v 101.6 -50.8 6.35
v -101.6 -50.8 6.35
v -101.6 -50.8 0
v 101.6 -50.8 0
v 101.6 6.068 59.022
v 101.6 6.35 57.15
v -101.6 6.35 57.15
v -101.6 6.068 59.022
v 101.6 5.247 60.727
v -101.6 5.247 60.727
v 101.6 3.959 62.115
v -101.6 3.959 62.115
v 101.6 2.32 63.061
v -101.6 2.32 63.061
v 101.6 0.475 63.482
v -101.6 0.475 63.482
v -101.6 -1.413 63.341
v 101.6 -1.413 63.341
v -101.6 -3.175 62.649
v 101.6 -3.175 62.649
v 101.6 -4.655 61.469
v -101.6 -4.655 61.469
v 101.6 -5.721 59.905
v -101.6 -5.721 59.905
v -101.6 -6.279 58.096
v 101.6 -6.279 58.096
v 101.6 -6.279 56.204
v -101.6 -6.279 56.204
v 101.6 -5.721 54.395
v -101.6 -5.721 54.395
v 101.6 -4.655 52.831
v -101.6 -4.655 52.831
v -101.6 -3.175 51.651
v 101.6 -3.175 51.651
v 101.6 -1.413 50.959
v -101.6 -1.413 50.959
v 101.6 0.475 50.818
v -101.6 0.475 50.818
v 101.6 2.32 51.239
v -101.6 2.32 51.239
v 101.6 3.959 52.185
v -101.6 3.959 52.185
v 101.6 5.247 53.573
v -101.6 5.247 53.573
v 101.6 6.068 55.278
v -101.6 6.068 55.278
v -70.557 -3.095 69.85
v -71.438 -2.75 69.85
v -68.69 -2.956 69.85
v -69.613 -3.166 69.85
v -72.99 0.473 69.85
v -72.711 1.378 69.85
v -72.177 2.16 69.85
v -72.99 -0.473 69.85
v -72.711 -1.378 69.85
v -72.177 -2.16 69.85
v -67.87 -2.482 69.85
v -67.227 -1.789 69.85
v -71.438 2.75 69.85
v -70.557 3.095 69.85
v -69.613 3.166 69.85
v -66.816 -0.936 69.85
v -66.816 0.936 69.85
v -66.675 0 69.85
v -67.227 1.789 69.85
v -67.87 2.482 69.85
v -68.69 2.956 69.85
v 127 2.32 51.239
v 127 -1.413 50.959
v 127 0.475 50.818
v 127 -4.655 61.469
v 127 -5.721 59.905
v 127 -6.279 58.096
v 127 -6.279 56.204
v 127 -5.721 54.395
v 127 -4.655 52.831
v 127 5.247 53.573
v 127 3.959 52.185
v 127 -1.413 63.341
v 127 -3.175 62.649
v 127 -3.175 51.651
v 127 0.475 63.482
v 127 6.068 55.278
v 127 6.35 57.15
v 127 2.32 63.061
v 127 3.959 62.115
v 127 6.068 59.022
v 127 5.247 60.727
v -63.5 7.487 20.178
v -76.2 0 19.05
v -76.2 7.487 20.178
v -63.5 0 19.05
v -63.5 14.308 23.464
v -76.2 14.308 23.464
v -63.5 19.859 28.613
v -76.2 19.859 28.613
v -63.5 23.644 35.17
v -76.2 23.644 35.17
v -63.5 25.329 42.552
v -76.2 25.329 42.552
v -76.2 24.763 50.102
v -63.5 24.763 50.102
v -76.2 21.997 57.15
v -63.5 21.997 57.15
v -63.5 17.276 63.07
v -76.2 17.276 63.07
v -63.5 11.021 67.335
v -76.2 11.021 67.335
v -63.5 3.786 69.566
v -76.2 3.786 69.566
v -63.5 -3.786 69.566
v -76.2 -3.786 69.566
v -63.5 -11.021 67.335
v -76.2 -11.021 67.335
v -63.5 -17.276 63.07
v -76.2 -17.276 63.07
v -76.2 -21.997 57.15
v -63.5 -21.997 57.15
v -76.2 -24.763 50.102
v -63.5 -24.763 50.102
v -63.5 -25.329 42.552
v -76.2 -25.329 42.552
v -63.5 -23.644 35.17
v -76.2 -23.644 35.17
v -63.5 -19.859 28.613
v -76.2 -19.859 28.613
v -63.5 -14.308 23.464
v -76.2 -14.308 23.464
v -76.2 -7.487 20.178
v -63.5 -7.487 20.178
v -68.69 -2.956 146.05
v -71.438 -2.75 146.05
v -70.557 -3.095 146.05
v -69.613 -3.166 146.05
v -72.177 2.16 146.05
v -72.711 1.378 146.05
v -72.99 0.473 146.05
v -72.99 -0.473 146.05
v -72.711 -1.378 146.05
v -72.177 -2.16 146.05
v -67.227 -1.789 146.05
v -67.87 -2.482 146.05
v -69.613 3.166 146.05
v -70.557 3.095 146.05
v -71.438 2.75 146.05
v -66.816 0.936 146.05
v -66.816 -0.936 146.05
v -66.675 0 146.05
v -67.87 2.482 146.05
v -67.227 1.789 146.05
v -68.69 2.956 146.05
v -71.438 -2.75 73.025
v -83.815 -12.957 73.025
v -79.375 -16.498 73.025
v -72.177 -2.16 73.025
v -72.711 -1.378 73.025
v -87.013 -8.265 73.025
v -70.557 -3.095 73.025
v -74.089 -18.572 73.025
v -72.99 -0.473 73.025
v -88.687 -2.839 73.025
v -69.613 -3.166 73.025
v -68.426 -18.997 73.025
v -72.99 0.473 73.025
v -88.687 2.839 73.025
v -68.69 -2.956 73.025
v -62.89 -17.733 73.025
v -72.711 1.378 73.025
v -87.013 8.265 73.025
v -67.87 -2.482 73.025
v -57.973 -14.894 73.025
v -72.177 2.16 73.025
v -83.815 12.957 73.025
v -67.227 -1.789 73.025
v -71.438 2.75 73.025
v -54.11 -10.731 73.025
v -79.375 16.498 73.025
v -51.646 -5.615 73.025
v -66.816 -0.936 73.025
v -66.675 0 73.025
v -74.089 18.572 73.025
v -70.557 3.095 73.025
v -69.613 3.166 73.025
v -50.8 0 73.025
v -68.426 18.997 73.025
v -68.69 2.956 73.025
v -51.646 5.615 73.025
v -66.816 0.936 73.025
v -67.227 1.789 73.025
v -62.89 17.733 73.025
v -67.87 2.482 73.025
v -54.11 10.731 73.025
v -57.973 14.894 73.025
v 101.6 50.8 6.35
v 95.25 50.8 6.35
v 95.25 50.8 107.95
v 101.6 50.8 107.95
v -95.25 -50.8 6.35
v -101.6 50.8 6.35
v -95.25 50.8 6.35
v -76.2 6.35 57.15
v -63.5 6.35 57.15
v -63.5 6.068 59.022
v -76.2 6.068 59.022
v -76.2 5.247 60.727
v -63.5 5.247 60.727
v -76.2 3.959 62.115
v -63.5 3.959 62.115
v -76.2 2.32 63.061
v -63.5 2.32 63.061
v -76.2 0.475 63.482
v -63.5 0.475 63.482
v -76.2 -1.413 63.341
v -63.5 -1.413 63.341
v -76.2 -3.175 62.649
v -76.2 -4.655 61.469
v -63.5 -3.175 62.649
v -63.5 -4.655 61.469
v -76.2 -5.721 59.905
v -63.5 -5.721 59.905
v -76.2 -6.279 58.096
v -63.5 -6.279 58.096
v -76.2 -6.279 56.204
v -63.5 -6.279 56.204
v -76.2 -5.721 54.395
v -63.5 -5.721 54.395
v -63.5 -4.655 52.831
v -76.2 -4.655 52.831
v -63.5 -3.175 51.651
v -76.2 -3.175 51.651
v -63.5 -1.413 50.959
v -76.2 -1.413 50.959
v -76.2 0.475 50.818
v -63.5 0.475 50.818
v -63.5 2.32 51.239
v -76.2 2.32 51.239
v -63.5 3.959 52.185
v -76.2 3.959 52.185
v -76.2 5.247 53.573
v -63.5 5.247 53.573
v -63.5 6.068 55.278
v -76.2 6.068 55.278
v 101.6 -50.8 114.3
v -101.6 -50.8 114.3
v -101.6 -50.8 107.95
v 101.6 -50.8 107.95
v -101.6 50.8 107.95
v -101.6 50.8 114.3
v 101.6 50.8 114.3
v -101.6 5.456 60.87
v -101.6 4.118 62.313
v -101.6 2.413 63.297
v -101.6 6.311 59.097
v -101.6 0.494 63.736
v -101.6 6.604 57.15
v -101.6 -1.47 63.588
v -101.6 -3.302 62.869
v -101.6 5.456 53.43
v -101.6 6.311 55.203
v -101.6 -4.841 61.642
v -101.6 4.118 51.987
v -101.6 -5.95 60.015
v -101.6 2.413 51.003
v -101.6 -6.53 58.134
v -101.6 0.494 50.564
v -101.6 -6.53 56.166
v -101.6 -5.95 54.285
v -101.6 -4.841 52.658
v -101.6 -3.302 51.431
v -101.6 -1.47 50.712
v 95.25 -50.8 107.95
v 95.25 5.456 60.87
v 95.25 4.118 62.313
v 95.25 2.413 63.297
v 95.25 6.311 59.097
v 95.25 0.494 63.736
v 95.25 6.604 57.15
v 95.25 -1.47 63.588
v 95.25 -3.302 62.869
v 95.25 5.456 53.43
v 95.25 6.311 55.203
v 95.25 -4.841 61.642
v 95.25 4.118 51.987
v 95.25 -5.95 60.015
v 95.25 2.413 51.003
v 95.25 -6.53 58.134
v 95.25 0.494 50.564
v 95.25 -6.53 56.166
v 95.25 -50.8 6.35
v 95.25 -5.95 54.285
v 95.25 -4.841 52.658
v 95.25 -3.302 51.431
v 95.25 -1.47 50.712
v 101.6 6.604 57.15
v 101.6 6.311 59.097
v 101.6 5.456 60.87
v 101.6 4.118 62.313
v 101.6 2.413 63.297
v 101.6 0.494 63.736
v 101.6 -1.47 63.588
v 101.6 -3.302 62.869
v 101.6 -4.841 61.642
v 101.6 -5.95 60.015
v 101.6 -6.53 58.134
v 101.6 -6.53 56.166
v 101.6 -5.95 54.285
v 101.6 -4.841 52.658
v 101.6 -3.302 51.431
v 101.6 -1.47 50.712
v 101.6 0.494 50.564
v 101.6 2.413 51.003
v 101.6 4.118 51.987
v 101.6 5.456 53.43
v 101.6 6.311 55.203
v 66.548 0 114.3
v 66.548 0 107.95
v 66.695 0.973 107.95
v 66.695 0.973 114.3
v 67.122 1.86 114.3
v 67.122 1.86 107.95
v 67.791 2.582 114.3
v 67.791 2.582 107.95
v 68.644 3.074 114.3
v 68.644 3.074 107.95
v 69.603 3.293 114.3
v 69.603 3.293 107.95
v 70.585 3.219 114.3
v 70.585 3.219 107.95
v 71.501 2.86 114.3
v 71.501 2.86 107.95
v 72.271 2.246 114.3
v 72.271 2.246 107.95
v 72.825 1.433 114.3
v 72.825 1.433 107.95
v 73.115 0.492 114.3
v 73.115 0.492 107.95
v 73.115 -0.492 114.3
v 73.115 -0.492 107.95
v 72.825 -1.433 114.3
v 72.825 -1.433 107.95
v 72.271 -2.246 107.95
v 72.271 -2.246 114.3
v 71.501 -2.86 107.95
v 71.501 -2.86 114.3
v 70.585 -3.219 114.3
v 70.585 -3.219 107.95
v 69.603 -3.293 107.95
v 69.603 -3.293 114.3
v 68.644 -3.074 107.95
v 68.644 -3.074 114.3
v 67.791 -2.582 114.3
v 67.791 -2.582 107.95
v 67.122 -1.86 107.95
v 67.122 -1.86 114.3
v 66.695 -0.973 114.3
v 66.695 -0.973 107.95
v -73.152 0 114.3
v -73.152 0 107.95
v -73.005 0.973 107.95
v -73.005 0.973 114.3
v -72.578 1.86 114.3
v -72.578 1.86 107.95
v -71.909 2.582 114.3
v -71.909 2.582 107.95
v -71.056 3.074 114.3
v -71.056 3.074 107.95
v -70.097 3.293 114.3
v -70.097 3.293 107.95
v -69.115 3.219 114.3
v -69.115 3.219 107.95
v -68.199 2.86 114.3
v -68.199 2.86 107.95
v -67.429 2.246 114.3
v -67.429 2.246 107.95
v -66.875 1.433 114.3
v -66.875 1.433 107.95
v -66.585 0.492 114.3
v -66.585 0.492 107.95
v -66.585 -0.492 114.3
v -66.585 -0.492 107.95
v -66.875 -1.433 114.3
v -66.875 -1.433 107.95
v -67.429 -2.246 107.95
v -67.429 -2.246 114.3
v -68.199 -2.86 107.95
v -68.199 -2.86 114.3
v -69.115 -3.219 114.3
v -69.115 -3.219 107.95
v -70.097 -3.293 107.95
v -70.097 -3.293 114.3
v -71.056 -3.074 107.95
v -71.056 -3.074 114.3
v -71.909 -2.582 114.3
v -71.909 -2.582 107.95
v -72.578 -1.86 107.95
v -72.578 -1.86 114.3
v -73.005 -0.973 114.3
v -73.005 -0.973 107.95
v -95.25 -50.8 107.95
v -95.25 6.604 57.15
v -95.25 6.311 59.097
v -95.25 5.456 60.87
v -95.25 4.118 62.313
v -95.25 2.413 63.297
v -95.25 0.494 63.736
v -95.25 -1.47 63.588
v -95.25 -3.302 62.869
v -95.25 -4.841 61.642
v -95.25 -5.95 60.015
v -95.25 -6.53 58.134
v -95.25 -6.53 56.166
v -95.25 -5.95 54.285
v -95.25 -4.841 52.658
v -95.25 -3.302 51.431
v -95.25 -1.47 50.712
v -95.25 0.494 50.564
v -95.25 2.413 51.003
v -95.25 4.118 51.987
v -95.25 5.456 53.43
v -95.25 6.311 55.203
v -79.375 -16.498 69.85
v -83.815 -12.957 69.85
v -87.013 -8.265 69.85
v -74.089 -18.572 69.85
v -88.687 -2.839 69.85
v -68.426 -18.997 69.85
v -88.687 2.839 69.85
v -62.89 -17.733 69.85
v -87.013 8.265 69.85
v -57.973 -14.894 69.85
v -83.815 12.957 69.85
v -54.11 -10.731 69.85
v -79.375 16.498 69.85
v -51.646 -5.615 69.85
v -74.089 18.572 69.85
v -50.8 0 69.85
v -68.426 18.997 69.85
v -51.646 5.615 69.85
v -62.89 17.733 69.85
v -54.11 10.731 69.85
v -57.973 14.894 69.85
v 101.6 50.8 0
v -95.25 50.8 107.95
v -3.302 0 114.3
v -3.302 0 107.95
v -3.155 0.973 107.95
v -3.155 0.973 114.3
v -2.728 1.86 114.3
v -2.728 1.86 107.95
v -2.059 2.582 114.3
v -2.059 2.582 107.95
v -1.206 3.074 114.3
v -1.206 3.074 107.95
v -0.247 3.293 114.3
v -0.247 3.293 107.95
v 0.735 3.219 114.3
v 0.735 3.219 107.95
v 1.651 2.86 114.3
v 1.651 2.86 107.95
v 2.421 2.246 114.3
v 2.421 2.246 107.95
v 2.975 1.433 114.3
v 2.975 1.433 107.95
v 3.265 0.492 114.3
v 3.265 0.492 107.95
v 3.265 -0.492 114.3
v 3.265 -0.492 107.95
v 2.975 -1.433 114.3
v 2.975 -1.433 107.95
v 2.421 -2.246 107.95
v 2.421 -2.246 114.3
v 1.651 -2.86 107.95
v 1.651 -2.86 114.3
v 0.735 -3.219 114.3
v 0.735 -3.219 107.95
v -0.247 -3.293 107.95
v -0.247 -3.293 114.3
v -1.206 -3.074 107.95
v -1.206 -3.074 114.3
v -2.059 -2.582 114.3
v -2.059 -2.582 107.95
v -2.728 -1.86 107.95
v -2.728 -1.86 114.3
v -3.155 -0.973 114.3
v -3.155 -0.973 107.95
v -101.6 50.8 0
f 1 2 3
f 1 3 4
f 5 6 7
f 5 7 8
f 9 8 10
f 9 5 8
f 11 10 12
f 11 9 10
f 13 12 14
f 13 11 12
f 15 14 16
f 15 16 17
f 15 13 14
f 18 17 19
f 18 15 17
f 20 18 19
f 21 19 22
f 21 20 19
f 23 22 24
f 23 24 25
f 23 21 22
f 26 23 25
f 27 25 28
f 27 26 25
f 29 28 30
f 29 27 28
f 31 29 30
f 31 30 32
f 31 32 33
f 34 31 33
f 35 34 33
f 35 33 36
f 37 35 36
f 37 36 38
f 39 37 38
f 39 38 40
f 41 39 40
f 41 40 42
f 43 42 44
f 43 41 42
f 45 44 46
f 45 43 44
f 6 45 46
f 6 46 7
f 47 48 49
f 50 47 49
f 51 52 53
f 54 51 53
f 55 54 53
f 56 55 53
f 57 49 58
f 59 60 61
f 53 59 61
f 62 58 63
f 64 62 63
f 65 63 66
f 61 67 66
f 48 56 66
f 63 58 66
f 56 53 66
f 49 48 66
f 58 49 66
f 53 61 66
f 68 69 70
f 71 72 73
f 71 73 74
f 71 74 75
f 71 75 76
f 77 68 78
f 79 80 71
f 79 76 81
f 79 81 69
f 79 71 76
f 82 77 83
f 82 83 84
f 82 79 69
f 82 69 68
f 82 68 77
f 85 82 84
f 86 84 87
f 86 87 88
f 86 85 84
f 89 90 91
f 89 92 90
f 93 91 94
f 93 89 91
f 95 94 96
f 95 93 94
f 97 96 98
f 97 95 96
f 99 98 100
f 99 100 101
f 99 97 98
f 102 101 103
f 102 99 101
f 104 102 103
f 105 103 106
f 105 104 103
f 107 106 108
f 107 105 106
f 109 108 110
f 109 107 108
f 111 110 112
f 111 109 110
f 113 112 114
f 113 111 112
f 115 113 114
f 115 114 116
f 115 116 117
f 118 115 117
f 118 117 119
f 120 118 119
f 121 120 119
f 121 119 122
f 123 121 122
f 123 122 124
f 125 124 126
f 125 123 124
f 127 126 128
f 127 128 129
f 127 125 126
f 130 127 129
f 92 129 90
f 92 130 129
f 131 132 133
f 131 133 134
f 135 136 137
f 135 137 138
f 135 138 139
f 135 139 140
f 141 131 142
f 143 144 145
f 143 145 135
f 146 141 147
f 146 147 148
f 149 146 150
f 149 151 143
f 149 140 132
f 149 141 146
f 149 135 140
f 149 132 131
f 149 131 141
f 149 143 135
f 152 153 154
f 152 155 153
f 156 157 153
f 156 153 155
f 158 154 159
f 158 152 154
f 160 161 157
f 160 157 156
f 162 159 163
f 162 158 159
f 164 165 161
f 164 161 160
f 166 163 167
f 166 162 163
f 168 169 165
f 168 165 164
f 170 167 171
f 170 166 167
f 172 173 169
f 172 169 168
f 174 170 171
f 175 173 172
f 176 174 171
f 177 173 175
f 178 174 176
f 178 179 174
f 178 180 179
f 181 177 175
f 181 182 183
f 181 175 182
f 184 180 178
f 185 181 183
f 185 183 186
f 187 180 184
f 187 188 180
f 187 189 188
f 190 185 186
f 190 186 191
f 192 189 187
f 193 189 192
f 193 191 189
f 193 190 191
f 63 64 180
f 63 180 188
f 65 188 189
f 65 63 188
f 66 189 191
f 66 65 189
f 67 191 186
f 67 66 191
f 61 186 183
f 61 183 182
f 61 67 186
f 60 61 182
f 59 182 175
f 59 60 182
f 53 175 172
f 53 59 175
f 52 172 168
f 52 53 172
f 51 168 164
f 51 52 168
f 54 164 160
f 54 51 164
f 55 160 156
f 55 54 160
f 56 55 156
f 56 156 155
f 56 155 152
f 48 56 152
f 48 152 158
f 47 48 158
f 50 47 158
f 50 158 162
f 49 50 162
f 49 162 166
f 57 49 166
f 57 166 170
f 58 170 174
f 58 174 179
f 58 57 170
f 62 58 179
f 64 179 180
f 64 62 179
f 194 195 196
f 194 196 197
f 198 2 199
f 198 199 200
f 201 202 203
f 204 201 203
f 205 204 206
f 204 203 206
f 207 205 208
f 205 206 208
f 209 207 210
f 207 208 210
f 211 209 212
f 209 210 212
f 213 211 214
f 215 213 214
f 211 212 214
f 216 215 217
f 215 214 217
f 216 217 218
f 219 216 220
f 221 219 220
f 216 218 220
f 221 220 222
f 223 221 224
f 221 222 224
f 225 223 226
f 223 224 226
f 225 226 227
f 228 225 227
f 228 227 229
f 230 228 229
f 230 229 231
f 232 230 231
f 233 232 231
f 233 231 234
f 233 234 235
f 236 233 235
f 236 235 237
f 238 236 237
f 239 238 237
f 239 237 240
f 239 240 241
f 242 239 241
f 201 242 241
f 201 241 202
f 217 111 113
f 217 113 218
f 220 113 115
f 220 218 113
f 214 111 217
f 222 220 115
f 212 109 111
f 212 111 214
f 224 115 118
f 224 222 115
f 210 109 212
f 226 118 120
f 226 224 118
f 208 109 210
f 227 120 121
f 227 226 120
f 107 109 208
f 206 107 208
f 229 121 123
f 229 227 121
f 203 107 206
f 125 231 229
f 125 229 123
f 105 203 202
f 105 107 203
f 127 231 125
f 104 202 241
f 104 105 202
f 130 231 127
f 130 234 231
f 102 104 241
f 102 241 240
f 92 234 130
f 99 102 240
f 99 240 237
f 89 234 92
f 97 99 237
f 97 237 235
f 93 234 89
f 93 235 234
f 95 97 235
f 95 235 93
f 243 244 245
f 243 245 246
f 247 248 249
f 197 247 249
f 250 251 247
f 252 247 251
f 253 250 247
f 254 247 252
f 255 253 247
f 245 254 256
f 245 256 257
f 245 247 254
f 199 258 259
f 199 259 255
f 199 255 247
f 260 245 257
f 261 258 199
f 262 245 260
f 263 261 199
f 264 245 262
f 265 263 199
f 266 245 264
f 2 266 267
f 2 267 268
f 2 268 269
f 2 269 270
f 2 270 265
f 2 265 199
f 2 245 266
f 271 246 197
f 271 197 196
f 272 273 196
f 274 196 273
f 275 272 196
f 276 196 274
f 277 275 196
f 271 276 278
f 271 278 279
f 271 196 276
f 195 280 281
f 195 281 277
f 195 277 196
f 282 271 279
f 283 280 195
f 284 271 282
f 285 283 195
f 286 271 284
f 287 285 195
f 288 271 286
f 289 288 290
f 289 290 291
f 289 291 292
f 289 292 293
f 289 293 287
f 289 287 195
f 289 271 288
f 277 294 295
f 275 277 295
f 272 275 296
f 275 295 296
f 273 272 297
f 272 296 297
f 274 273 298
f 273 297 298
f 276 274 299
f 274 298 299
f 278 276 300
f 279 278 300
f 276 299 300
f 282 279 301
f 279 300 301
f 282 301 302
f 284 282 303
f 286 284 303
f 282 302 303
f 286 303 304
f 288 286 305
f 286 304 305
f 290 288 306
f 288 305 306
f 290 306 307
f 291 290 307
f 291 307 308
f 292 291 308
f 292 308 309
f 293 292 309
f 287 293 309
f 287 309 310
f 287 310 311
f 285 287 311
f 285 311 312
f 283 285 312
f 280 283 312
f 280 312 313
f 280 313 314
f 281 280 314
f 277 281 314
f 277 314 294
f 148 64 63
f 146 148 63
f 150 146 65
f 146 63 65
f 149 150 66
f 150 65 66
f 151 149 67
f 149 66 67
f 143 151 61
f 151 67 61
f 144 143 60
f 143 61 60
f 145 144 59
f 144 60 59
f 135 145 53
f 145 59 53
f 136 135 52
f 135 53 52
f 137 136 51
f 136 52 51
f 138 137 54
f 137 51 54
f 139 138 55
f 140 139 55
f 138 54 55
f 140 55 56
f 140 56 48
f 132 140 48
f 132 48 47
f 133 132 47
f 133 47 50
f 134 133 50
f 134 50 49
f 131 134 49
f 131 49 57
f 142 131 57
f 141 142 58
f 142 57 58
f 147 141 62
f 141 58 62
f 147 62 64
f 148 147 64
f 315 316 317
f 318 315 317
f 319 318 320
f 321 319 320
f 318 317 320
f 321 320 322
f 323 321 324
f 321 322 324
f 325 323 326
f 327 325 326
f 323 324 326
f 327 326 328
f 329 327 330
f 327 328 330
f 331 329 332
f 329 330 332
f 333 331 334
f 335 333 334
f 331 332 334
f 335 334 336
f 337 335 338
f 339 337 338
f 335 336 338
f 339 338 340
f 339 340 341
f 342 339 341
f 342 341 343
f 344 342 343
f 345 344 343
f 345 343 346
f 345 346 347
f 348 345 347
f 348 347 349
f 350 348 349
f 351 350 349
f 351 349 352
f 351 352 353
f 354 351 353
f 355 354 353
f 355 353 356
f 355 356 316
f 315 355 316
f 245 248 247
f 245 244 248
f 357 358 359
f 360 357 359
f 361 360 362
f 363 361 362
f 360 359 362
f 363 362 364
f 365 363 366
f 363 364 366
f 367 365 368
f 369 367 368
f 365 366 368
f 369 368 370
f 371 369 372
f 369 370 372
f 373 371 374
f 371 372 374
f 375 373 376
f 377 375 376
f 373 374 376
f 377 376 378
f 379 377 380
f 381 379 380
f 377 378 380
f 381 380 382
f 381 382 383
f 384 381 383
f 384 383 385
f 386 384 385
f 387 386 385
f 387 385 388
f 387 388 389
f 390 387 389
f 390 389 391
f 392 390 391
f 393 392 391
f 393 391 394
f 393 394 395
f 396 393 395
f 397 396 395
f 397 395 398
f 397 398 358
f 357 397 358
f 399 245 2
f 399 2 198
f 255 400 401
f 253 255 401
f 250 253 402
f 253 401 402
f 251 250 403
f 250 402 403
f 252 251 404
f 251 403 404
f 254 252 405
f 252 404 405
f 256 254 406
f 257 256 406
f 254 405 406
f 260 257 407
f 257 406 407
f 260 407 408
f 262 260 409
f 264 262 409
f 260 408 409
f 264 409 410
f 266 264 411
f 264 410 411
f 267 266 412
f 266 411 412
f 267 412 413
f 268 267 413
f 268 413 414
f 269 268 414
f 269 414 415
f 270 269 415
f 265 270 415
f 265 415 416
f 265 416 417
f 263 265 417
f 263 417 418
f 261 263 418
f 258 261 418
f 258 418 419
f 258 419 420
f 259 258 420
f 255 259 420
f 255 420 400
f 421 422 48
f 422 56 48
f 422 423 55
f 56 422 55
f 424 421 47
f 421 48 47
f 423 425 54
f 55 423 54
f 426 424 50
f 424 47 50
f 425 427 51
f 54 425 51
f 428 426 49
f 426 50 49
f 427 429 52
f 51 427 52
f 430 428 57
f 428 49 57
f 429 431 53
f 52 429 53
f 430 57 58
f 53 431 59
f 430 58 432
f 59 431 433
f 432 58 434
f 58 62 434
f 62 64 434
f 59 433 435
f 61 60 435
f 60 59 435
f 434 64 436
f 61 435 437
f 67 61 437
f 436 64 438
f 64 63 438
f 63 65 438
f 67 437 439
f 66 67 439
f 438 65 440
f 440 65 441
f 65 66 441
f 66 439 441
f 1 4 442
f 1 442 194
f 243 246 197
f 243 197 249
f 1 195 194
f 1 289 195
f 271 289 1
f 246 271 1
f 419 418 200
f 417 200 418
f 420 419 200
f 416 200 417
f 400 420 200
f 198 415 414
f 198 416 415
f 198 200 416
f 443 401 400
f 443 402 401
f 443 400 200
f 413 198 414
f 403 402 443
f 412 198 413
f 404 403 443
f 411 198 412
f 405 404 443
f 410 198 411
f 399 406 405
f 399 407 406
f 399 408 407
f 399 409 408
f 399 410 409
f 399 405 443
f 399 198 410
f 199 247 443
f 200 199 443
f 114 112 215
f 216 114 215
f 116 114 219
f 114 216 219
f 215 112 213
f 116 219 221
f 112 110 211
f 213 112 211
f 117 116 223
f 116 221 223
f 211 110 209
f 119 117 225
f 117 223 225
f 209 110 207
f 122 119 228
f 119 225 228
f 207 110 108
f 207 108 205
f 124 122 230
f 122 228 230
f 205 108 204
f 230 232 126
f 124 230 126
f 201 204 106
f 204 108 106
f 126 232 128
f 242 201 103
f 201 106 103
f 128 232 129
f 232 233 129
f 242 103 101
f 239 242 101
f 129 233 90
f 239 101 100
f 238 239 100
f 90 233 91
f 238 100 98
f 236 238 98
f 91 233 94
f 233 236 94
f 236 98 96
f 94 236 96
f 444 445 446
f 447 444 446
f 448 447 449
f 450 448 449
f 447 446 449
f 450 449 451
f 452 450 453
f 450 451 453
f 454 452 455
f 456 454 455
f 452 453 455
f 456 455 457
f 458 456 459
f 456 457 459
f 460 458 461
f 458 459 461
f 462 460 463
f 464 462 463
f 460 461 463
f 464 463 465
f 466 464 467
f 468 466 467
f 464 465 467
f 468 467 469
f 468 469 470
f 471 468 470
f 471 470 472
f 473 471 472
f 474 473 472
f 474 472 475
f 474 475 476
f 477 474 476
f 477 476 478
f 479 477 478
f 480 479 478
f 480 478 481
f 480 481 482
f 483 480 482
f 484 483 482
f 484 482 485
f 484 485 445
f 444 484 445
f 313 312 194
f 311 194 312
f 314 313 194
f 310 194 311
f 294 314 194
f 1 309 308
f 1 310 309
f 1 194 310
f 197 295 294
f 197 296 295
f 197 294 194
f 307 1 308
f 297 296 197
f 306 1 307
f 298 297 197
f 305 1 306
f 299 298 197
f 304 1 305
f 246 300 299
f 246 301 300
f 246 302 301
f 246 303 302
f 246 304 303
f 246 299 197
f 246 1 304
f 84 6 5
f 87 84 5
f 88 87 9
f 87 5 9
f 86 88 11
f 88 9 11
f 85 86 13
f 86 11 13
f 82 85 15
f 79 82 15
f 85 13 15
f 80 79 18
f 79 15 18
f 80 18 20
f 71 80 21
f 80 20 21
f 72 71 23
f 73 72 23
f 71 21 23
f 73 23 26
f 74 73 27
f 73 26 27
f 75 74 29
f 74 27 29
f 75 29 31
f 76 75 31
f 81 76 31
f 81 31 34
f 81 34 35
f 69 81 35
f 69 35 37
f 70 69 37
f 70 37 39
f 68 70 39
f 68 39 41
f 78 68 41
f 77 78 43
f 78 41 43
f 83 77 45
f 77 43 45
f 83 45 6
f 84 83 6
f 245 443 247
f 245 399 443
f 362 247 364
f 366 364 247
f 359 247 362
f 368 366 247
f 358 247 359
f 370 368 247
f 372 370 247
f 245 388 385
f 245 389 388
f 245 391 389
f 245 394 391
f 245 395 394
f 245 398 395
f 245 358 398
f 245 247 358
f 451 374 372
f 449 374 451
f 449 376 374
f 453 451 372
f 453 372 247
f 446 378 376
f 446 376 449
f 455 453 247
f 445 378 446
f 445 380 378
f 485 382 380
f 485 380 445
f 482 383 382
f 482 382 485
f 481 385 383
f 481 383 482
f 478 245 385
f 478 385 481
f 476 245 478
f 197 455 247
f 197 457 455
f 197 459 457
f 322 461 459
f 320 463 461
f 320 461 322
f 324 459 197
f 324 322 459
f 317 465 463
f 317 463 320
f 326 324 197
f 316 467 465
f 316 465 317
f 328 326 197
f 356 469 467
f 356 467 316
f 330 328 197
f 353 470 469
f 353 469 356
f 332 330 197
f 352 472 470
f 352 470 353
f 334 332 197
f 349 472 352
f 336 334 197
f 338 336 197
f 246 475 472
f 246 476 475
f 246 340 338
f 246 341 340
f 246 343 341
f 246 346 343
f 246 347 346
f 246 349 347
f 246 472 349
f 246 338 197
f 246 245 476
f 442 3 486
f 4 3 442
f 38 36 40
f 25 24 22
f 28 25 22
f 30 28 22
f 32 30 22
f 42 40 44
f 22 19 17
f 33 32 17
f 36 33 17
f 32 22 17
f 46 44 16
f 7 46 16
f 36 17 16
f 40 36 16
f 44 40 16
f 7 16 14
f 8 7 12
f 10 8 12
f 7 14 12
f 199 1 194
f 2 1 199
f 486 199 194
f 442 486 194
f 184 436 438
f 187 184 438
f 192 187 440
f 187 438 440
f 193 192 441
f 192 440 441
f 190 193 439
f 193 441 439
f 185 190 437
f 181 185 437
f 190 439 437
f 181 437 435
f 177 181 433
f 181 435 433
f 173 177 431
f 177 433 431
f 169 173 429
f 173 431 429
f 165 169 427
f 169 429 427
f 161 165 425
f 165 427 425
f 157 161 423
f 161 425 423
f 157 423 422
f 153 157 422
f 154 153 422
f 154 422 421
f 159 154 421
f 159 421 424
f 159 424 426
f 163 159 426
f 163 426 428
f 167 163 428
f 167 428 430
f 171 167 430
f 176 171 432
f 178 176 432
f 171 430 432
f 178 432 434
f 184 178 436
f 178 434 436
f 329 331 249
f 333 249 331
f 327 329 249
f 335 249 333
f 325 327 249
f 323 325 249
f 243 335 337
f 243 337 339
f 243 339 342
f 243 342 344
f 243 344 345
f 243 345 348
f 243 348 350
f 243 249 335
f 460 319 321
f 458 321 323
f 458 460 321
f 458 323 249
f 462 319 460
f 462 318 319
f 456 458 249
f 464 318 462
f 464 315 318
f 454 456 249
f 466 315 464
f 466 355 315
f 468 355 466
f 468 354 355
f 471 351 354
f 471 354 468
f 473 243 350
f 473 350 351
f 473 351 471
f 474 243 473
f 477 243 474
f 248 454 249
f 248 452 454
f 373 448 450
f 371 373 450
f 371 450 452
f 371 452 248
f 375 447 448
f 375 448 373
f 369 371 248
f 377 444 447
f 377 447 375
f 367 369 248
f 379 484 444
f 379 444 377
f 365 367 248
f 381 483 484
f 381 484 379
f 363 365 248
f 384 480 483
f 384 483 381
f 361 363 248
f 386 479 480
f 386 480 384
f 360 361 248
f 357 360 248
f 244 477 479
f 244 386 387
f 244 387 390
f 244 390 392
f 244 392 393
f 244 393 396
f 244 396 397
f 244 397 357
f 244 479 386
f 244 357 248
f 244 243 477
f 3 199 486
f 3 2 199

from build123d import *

# Parameters (mm, degrees)
F2_DEPTH      = 50.8
F3_DEPTH      = 50.8
F3_DEPTH_BACK = 50.8
F1_W          = 12.7
F1_H          = 25.4
F5_R          = 6.604
F5_R_2        = 6.35
F6_DEPTH      = 203.201
F7_DEPTH      = 203.2
F7_DEPTH_BACK = 25.4
F12_D         = 6.604
F10_R         = 3.175
F13_DEPTH     = 76.2
F10_R_2       = 19.05
F14_DEPTH     = 3.175


with BuildPart() as f2:
    # F1 (on Front) → F2 (new body, symmetric)
    with BuildSketch(Plane.XZ):
        Polygon((-101.6, 114.3), (-101.6, 107.95), (-95.25, 107.95), (95.25, 107.95), (101.6, 107.95), (101.6, 114.3), align=None)
    extrude(amount=F2_DEPTH, both=True)

    # F12 (through all)
    with Locations(Plane.XY.offset(114.3)):
        with Locations((-69.85, 0), (0, 0), (69.85, 0)):
            Hole(F12_D / 2)


with BuildPart() as f2b:
    # F1 (on Front) → F2, piece 2 (new body, symmetric)
    with BuildSketch(Plane.XZ):
        Polygon((-101.6, 6.35), (-101.6, 0), (101.6, 0), (101.6, 6.35), (95.25, 6.35), (-95.25, 6.35), align=None)
    extrude(amount=F2_DEPTH, both=True)


with BuildPart() as f3:
    # F1 (on Front) → F3 (new body, two sides)
    with BuildSketch(Plane.XZ) as f3_sk:
        Polygon((-101.6, 107.95), (-101.6, 6.35), (-95.25, 6.35), (-95.25, 57.15), (-95.25, 107.95), align=None)
    extrude(amount=F3_DEPTH)
    extrude(f3_sk.sketch, amount=-F3_DEPTH_BACK)


with BuildPart() as f3b:
    # F1 (on Front) → F3, piece 2 (new body, two sides)
    with BuildSketch(Plane.XZ) as f3_2_sk:
        Polygon((95.25, 6.35), (101.6, 6.35), (101.6, 107.95), (95.25, 107.95), (95.25, 57.15), align=None)
    extrude(amount=F3_DEPTH)
    extrude(f3_2_sk.sketch, amount=-F3_DEPTH_BACK)


with BuildPart() as f4:
    # F1 (on Front) → F4 (revolve)
    with BuildSketch(Plane.XZ):
        with Locations((-69.85, 31.75)):
            Rectangle(F1_W, F1_H)
    revolve(axis=Axis((-69.85, 0, 44.45), (1, 0, 0)))


with BuildPart() as f6_tool:
    # F5 (on face) → F6 (new body, through all)
    with BuildSketch(Plane.YZ.offset(101.6)):
        with Locations((0, 57.15)):
            Circle(F5_R)
        with Locations((0, 57.15)):
            Circle(F5_R_2, mode=Mode.SUBTRACT)
        with Locations((0, 57.15)):
            Circle(F5_R_2)
    extrude(amount=-F6_DEPTH)


with BuildPart() as f3_1:
    add(f3.part)

    # F6: cut by f6_tool
    add(f6_tool.part, mode=Mode.SUBTRACT)


with BuildPart() as f3b_1:
    add(f3b.part)

    # F6: cut by f6_tool
    add(f6_tool.part, mode=Mode.SUBTRACT)


with BuildPart() as f7:
    # F5 (on face) → F7 (new body, two sides)
    with BuildSketch(Plane.YZ.offset(101.6)) as f7_sk:
        with Locations((0, 57.15)):
            Circle(F5_R_2)
    extrude(amount=-F7_DEPTH)
    extrude(f7_sk.sketch, amount=F7_DEPTH_BACK)


with BuildPart() as f4_1:
    add(f4.part)

    # F8: cut F7
    add(f7.part, mode=Mode.SUBTRACT)


with BuildPart() as f13:
    # F10 (on plane+point) → F13 (new body, through all)
    with BuildSketch(Plane.XY.offset(69.85)):
        with Locations((-69.85, 0)):
            Circle(F10_R)
    extrude(amount=F13_DEPTH)


with BuildPart() as f14:
    # F10 (on plane+point) → F14 (new body)
    with BuildSketch(Plane.XY.offset(69.85)):
        with Locations((-69.85, 0)):
            Circle(F10_R_2)
        with Locations((-69.85, 0)):
            Circle(F10_R, mode=Mode.SUBTRACT)
    extrude(amount=F14_DEPTH)


solid = Compound([f2.part, f2b.part, f3_1.part, f3b_1.part, f7.part, f4_1.part, f13.part, f14.part])
